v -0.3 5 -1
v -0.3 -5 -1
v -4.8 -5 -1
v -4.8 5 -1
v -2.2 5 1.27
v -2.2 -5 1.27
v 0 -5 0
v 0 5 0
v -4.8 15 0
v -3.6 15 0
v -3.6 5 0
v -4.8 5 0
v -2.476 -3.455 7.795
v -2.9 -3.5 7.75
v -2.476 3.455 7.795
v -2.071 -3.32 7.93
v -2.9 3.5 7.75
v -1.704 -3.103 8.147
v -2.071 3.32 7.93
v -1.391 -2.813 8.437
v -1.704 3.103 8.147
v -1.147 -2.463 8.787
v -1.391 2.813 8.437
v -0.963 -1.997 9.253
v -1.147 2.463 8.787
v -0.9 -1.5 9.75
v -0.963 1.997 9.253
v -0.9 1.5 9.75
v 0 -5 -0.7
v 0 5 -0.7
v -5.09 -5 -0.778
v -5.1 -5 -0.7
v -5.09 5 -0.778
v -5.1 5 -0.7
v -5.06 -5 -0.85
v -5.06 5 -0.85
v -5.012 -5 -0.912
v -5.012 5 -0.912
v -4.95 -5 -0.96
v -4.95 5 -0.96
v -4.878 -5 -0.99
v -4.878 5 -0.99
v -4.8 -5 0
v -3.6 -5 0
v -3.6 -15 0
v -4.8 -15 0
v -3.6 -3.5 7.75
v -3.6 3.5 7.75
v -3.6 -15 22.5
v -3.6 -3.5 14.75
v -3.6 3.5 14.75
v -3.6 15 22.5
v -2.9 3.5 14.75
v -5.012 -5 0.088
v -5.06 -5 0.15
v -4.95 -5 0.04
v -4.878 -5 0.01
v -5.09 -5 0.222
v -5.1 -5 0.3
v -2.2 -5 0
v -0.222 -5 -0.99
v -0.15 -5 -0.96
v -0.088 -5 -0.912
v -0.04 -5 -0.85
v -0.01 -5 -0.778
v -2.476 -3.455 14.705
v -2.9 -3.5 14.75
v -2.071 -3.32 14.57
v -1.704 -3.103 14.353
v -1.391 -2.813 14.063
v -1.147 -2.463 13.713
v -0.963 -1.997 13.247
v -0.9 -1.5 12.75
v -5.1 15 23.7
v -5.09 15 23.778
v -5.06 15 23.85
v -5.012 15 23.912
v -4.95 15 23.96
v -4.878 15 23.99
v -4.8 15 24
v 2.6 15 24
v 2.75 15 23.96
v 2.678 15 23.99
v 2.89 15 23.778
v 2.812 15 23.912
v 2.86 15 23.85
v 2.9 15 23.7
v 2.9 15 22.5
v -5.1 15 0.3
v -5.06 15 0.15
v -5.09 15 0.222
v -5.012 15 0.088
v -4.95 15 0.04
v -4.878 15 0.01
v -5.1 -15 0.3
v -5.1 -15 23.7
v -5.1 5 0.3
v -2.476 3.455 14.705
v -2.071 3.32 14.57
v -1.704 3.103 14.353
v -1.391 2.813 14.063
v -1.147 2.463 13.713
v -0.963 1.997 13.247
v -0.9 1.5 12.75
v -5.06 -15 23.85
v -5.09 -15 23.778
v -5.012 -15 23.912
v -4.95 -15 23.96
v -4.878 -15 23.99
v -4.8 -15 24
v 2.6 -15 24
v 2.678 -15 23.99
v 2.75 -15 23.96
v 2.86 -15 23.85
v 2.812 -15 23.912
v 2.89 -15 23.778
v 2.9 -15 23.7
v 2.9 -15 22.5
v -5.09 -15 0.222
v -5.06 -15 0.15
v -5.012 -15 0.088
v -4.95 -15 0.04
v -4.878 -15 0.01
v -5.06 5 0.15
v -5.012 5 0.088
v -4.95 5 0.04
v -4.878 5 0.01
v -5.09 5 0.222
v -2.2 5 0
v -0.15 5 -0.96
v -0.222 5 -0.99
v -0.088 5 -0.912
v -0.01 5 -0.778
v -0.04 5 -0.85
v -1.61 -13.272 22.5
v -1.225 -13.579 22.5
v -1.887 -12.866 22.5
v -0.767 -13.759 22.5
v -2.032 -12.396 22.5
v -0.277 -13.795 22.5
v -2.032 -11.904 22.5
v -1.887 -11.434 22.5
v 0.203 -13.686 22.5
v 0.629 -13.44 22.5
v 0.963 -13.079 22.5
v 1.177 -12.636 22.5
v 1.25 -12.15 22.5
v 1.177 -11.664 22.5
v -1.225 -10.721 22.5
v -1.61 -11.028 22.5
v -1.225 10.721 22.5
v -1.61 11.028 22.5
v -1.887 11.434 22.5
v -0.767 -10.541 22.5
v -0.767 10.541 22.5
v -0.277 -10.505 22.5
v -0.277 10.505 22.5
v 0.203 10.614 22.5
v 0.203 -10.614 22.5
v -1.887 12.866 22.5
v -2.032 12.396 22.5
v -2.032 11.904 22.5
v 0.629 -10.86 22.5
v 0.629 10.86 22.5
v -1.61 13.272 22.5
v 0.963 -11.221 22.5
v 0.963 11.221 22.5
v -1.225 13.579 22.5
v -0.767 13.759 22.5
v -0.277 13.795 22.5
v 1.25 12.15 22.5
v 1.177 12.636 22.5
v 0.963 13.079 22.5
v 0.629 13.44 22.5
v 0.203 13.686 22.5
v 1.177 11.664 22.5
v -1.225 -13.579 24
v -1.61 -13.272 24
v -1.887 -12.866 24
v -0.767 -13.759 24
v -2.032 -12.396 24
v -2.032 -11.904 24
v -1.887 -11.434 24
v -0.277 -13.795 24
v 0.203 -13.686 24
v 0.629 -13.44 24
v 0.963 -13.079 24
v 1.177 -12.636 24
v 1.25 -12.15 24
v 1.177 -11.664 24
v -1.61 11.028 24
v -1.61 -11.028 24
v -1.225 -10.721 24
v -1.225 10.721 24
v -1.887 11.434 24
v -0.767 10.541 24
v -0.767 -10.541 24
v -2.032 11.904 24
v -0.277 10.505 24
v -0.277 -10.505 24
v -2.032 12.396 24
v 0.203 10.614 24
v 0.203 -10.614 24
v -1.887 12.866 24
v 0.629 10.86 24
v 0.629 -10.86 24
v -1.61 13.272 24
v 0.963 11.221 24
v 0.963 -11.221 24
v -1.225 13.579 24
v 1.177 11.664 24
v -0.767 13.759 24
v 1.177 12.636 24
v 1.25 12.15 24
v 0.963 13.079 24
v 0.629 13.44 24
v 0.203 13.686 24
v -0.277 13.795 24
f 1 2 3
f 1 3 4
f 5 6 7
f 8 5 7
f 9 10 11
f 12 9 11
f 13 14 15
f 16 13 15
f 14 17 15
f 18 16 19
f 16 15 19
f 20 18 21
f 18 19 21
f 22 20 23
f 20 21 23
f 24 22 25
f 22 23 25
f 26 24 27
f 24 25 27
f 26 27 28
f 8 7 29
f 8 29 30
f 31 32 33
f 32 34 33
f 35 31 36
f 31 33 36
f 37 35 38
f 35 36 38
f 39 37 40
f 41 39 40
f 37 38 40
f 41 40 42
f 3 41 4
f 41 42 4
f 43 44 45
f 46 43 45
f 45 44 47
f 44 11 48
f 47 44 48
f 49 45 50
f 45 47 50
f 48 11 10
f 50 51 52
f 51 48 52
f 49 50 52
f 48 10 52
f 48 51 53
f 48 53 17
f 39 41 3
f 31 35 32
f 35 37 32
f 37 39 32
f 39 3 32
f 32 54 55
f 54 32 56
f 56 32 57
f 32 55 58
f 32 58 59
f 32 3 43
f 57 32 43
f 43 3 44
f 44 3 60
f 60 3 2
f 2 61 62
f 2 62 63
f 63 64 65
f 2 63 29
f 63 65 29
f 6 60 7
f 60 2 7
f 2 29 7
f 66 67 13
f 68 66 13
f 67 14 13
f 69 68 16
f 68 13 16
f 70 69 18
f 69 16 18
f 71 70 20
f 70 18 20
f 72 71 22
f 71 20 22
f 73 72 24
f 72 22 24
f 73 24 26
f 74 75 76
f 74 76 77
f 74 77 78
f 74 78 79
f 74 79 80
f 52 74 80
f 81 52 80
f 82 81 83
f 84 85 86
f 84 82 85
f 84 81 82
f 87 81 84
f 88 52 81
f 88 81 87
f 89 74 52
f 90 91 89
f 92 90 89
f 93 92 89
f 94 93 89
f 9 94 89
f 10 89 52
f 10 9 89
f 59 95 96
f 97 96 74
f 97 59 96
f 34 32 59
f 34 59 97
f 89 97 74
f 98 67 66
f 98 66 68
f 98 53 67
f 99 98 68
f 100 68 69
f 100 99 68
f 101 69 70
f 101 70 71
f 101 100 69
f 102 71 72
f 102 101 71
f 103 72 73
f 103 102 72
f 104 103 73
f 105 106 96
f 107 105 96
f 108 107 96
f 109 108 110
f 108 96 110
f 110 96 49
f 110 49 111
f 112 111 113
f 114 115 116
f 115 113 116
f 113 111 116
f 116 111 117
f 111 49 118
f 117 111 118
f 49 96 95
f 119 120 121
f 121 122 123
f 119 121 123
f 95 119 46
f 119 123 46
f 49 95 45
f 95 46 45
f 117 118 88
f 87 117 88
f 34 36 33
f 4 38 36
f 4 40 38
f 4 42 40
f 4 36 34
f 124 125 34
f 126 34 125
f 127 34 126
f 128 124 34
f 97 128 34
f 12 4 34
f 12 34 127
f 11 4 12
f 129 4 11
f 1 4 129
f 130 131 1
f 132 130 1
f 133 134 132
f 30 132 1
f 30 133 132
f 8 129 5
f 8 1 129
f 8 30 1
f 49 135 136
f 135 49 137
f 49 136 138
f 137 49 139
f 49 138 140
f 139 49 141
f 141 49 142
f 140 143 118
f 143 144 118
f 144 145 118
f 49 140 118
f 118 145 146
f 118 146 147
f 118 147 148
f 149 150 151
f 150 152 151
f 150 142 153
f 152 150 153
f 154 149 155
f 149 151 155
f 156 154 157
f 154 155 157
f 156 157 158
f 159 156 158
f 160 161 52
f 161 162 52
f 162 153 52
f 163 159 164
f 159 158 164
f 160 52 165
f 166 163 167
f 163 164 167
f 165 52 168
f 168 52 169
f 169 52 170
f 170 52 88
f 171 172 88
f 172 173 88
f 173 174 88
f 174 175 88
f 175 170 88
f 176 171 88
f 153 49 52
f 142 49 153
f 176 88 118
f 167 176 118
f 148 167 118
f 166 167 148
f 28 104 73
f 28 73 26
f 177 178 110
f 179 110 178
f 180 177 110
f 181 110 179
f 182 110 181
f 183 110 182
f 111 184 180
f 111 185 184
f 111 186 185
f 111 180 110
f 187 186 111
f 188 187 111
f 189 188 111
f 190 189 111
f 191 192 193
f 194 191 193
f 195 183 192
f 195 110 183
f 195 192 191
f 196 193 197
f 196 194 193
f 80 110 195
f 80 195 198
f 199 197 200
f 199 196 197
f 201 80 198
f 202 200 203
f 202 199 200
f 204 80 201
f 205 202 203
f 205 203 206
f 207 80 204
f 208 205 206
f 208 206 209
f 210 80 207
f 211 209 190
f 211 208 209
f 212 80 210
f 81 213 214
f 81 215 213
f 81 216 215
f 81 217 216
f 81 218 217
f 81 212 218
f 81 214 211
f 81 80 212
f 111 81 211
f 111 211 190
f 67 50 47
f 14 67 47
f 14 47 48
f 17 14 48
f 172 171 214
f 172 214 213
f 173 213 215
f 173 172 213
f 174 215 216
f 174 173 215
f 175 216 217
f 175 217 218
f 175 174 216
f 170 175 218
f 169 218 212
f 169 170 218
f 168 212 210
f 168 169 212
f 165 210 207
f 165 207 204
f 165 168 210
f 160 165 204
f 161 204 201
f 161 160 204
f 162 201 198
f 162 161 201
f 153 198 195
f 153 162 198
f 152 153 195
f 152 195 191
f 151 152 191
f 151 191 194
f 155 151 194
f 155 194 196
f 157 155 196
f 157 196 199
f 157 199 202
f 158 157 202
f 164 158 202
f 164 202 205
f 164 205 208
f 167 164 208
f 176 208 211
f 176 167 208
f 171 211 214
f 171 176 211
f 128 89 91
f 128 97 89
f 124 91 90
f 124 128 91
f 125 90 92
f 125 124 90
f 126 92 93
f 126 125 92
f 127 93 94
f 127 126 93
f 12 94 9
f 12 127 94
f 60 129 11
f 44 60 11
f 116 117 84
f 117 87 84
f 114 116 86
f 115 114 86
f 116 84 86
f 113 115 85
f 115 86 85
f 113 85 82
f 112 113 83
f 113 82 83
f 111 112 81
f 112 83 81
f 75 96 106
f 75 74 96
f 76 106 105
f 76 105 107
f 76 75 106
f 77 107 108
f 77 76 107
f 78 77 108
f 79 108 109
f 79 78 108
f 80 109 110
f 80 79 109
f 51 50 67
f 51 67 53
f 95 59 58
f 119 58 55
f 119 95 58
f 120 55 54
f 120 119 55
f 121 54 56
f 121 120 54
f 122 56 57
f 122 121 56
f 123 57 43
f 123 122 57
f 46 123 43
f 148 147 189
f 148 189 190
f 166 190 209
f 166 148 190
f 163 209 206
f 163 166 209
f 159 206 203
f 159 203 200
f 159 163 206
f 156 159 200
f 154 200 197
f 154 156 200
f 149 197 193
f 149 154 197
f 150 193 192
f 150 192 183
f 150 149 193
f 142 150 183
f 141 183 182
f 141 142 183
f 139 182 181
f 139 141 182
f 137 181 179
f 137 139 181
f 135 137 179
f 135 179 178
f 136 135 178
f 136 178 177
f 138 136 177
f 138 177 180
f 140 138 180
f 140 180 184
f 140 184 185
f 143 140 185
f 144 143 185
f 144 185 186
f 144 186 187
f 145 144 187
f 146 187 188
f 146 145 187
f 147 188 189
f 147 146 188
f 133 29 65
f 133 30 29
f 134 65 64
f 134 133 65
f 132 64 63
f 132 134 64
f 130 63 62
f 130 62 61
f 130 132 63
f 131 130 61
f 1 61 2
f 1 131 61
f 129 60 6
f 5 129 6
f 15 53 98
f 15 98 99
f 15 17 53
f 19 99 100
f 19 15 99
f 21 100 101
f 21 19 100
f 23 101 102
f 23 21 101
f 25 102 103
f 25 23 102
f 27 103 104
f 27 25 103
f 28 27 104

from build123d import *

# Parameters (mm, degrees)
BOSS_EXTRUDE1_DEPTH      = 5
BOSS_EXTRUDE1_DEPTH_BACK = 5
SKETCH2_W                = 3.6
SKETCH2_H                = 10
BOSS_EXTRUDE2_DEPTH      = 1
BOSS_EXTRUDE3_DEPTH      = 1.5
SKETCH4_W                = 8
SKETCH4_H                = 30
SKETCH4_R                = 1.65
BOSS_EXTRUDE4_DEPTH      = 1.5
FILLET1_R                = 0.3
SKETCH5_W                = 7
SKETCH5_H                = 7
BOSS_EXTRUDE5_DEPTH      = 2.7
FILLET2_R                = 2


with BuildPart() as part:
    # Sketch1 → Boss-Extrude1 (new, two sides: drawn at the far end of the back side and taken through both)
    with BuildSketch(Plane(origin=(0, 0, 0), x_dir=(1, 0, 0), z_dir=(0, 1, 0)).offset(-BOSS_EXTRUDE1_DEPTH_BACK)):
        Polygon((0, 0), (-2.2, 0), (-2.2, -1.270170592), align=None)
    extrude(amount=BOSS_EXTRUDE1_DEPTH + BOSS_EXTRUDE1_DEPTH_BACK)

    # Sketch2 → Boss-Extrude2 (add)
    with BuildSketch(Plane(origin=(0, 0, 0), x_dir=(-1, 0, 0), z_dir=(0, 0, -1))):
        with Locations((1.8, 0)):
            Rectangle(SKETCH2_W, SKETCH2_H)
    extrude(amount=BOSS_EXTRUDE2_DEPTH)

    # Sketch3 → Boss-Extrude3 (add)
    with BuildSketch(Plane.ZY.offset(3.6)):
        Polygon((0, -5), (0, -15), (22.5, -15), (22.5, 15), (0, 15), (0, 5), (-1, 5), (-1, -5), align=None)
    extrude(amount=BOSS_EXTRUDE3_DEPTH)

    # Sketch4 → Boss-Extrude4 (add)
    with BuildSketch(Plane.XY.offset(22.5)):
        with Locations((-1.1, 0)):
            Rectangle(SKETCH4_W, SKETCH4_H)
        with Locations((-0.4, 12.15)):
            Circle(SKETCH4_R, mode=Mode.SUBTRACT)
        with Locations((-0.4, -12.15)):
            Circle(SKETCH4_R, mode=Mode.SUBTRACT)
    extrude(amount=BOSS_EXTRUDE4_DEPTH)

    # Fillet1
    fillet1_edges = [part.edges().sort_by_distance(p)[0] for p in [
        (-5.1, 0, -1),
        (-5.1, 0, 24),
        (-5.1, -10, 0),
        (-5.1, 10, 0),
        (2.9, 0, 24),
        (0, 0, -1),
    ]]
    fillet(fillet1_edges, radius=FILLET1_R)

    # Sketch5 → Boss-Extrude5 (add)
    with BuildSketch(Plane(origin=(-3.6, 0, 0), x_dir=(0, 0, -1), z_dir=(1, 0, 0))):
        with Locations((-11.25, 0)):
            Rectangle(SKETCH5_W, SKETCH5_H)
    extrude(amount=BOSS_EXTRUDE5_DEPTH)

    # Fillet2
    fillet2_edges = [part.edges().sort_by_distance(p)[0] for p in [
        (-0.9, 0, 14.75),
        (-0.9, 3.5, 11.25),
        (-0.9, 0, 7.75),
        (-0.9, -3.5, 11.25),
    ]]
    fillet(fillet2_edges, radius=FILLET2_R)


solid = part.part
